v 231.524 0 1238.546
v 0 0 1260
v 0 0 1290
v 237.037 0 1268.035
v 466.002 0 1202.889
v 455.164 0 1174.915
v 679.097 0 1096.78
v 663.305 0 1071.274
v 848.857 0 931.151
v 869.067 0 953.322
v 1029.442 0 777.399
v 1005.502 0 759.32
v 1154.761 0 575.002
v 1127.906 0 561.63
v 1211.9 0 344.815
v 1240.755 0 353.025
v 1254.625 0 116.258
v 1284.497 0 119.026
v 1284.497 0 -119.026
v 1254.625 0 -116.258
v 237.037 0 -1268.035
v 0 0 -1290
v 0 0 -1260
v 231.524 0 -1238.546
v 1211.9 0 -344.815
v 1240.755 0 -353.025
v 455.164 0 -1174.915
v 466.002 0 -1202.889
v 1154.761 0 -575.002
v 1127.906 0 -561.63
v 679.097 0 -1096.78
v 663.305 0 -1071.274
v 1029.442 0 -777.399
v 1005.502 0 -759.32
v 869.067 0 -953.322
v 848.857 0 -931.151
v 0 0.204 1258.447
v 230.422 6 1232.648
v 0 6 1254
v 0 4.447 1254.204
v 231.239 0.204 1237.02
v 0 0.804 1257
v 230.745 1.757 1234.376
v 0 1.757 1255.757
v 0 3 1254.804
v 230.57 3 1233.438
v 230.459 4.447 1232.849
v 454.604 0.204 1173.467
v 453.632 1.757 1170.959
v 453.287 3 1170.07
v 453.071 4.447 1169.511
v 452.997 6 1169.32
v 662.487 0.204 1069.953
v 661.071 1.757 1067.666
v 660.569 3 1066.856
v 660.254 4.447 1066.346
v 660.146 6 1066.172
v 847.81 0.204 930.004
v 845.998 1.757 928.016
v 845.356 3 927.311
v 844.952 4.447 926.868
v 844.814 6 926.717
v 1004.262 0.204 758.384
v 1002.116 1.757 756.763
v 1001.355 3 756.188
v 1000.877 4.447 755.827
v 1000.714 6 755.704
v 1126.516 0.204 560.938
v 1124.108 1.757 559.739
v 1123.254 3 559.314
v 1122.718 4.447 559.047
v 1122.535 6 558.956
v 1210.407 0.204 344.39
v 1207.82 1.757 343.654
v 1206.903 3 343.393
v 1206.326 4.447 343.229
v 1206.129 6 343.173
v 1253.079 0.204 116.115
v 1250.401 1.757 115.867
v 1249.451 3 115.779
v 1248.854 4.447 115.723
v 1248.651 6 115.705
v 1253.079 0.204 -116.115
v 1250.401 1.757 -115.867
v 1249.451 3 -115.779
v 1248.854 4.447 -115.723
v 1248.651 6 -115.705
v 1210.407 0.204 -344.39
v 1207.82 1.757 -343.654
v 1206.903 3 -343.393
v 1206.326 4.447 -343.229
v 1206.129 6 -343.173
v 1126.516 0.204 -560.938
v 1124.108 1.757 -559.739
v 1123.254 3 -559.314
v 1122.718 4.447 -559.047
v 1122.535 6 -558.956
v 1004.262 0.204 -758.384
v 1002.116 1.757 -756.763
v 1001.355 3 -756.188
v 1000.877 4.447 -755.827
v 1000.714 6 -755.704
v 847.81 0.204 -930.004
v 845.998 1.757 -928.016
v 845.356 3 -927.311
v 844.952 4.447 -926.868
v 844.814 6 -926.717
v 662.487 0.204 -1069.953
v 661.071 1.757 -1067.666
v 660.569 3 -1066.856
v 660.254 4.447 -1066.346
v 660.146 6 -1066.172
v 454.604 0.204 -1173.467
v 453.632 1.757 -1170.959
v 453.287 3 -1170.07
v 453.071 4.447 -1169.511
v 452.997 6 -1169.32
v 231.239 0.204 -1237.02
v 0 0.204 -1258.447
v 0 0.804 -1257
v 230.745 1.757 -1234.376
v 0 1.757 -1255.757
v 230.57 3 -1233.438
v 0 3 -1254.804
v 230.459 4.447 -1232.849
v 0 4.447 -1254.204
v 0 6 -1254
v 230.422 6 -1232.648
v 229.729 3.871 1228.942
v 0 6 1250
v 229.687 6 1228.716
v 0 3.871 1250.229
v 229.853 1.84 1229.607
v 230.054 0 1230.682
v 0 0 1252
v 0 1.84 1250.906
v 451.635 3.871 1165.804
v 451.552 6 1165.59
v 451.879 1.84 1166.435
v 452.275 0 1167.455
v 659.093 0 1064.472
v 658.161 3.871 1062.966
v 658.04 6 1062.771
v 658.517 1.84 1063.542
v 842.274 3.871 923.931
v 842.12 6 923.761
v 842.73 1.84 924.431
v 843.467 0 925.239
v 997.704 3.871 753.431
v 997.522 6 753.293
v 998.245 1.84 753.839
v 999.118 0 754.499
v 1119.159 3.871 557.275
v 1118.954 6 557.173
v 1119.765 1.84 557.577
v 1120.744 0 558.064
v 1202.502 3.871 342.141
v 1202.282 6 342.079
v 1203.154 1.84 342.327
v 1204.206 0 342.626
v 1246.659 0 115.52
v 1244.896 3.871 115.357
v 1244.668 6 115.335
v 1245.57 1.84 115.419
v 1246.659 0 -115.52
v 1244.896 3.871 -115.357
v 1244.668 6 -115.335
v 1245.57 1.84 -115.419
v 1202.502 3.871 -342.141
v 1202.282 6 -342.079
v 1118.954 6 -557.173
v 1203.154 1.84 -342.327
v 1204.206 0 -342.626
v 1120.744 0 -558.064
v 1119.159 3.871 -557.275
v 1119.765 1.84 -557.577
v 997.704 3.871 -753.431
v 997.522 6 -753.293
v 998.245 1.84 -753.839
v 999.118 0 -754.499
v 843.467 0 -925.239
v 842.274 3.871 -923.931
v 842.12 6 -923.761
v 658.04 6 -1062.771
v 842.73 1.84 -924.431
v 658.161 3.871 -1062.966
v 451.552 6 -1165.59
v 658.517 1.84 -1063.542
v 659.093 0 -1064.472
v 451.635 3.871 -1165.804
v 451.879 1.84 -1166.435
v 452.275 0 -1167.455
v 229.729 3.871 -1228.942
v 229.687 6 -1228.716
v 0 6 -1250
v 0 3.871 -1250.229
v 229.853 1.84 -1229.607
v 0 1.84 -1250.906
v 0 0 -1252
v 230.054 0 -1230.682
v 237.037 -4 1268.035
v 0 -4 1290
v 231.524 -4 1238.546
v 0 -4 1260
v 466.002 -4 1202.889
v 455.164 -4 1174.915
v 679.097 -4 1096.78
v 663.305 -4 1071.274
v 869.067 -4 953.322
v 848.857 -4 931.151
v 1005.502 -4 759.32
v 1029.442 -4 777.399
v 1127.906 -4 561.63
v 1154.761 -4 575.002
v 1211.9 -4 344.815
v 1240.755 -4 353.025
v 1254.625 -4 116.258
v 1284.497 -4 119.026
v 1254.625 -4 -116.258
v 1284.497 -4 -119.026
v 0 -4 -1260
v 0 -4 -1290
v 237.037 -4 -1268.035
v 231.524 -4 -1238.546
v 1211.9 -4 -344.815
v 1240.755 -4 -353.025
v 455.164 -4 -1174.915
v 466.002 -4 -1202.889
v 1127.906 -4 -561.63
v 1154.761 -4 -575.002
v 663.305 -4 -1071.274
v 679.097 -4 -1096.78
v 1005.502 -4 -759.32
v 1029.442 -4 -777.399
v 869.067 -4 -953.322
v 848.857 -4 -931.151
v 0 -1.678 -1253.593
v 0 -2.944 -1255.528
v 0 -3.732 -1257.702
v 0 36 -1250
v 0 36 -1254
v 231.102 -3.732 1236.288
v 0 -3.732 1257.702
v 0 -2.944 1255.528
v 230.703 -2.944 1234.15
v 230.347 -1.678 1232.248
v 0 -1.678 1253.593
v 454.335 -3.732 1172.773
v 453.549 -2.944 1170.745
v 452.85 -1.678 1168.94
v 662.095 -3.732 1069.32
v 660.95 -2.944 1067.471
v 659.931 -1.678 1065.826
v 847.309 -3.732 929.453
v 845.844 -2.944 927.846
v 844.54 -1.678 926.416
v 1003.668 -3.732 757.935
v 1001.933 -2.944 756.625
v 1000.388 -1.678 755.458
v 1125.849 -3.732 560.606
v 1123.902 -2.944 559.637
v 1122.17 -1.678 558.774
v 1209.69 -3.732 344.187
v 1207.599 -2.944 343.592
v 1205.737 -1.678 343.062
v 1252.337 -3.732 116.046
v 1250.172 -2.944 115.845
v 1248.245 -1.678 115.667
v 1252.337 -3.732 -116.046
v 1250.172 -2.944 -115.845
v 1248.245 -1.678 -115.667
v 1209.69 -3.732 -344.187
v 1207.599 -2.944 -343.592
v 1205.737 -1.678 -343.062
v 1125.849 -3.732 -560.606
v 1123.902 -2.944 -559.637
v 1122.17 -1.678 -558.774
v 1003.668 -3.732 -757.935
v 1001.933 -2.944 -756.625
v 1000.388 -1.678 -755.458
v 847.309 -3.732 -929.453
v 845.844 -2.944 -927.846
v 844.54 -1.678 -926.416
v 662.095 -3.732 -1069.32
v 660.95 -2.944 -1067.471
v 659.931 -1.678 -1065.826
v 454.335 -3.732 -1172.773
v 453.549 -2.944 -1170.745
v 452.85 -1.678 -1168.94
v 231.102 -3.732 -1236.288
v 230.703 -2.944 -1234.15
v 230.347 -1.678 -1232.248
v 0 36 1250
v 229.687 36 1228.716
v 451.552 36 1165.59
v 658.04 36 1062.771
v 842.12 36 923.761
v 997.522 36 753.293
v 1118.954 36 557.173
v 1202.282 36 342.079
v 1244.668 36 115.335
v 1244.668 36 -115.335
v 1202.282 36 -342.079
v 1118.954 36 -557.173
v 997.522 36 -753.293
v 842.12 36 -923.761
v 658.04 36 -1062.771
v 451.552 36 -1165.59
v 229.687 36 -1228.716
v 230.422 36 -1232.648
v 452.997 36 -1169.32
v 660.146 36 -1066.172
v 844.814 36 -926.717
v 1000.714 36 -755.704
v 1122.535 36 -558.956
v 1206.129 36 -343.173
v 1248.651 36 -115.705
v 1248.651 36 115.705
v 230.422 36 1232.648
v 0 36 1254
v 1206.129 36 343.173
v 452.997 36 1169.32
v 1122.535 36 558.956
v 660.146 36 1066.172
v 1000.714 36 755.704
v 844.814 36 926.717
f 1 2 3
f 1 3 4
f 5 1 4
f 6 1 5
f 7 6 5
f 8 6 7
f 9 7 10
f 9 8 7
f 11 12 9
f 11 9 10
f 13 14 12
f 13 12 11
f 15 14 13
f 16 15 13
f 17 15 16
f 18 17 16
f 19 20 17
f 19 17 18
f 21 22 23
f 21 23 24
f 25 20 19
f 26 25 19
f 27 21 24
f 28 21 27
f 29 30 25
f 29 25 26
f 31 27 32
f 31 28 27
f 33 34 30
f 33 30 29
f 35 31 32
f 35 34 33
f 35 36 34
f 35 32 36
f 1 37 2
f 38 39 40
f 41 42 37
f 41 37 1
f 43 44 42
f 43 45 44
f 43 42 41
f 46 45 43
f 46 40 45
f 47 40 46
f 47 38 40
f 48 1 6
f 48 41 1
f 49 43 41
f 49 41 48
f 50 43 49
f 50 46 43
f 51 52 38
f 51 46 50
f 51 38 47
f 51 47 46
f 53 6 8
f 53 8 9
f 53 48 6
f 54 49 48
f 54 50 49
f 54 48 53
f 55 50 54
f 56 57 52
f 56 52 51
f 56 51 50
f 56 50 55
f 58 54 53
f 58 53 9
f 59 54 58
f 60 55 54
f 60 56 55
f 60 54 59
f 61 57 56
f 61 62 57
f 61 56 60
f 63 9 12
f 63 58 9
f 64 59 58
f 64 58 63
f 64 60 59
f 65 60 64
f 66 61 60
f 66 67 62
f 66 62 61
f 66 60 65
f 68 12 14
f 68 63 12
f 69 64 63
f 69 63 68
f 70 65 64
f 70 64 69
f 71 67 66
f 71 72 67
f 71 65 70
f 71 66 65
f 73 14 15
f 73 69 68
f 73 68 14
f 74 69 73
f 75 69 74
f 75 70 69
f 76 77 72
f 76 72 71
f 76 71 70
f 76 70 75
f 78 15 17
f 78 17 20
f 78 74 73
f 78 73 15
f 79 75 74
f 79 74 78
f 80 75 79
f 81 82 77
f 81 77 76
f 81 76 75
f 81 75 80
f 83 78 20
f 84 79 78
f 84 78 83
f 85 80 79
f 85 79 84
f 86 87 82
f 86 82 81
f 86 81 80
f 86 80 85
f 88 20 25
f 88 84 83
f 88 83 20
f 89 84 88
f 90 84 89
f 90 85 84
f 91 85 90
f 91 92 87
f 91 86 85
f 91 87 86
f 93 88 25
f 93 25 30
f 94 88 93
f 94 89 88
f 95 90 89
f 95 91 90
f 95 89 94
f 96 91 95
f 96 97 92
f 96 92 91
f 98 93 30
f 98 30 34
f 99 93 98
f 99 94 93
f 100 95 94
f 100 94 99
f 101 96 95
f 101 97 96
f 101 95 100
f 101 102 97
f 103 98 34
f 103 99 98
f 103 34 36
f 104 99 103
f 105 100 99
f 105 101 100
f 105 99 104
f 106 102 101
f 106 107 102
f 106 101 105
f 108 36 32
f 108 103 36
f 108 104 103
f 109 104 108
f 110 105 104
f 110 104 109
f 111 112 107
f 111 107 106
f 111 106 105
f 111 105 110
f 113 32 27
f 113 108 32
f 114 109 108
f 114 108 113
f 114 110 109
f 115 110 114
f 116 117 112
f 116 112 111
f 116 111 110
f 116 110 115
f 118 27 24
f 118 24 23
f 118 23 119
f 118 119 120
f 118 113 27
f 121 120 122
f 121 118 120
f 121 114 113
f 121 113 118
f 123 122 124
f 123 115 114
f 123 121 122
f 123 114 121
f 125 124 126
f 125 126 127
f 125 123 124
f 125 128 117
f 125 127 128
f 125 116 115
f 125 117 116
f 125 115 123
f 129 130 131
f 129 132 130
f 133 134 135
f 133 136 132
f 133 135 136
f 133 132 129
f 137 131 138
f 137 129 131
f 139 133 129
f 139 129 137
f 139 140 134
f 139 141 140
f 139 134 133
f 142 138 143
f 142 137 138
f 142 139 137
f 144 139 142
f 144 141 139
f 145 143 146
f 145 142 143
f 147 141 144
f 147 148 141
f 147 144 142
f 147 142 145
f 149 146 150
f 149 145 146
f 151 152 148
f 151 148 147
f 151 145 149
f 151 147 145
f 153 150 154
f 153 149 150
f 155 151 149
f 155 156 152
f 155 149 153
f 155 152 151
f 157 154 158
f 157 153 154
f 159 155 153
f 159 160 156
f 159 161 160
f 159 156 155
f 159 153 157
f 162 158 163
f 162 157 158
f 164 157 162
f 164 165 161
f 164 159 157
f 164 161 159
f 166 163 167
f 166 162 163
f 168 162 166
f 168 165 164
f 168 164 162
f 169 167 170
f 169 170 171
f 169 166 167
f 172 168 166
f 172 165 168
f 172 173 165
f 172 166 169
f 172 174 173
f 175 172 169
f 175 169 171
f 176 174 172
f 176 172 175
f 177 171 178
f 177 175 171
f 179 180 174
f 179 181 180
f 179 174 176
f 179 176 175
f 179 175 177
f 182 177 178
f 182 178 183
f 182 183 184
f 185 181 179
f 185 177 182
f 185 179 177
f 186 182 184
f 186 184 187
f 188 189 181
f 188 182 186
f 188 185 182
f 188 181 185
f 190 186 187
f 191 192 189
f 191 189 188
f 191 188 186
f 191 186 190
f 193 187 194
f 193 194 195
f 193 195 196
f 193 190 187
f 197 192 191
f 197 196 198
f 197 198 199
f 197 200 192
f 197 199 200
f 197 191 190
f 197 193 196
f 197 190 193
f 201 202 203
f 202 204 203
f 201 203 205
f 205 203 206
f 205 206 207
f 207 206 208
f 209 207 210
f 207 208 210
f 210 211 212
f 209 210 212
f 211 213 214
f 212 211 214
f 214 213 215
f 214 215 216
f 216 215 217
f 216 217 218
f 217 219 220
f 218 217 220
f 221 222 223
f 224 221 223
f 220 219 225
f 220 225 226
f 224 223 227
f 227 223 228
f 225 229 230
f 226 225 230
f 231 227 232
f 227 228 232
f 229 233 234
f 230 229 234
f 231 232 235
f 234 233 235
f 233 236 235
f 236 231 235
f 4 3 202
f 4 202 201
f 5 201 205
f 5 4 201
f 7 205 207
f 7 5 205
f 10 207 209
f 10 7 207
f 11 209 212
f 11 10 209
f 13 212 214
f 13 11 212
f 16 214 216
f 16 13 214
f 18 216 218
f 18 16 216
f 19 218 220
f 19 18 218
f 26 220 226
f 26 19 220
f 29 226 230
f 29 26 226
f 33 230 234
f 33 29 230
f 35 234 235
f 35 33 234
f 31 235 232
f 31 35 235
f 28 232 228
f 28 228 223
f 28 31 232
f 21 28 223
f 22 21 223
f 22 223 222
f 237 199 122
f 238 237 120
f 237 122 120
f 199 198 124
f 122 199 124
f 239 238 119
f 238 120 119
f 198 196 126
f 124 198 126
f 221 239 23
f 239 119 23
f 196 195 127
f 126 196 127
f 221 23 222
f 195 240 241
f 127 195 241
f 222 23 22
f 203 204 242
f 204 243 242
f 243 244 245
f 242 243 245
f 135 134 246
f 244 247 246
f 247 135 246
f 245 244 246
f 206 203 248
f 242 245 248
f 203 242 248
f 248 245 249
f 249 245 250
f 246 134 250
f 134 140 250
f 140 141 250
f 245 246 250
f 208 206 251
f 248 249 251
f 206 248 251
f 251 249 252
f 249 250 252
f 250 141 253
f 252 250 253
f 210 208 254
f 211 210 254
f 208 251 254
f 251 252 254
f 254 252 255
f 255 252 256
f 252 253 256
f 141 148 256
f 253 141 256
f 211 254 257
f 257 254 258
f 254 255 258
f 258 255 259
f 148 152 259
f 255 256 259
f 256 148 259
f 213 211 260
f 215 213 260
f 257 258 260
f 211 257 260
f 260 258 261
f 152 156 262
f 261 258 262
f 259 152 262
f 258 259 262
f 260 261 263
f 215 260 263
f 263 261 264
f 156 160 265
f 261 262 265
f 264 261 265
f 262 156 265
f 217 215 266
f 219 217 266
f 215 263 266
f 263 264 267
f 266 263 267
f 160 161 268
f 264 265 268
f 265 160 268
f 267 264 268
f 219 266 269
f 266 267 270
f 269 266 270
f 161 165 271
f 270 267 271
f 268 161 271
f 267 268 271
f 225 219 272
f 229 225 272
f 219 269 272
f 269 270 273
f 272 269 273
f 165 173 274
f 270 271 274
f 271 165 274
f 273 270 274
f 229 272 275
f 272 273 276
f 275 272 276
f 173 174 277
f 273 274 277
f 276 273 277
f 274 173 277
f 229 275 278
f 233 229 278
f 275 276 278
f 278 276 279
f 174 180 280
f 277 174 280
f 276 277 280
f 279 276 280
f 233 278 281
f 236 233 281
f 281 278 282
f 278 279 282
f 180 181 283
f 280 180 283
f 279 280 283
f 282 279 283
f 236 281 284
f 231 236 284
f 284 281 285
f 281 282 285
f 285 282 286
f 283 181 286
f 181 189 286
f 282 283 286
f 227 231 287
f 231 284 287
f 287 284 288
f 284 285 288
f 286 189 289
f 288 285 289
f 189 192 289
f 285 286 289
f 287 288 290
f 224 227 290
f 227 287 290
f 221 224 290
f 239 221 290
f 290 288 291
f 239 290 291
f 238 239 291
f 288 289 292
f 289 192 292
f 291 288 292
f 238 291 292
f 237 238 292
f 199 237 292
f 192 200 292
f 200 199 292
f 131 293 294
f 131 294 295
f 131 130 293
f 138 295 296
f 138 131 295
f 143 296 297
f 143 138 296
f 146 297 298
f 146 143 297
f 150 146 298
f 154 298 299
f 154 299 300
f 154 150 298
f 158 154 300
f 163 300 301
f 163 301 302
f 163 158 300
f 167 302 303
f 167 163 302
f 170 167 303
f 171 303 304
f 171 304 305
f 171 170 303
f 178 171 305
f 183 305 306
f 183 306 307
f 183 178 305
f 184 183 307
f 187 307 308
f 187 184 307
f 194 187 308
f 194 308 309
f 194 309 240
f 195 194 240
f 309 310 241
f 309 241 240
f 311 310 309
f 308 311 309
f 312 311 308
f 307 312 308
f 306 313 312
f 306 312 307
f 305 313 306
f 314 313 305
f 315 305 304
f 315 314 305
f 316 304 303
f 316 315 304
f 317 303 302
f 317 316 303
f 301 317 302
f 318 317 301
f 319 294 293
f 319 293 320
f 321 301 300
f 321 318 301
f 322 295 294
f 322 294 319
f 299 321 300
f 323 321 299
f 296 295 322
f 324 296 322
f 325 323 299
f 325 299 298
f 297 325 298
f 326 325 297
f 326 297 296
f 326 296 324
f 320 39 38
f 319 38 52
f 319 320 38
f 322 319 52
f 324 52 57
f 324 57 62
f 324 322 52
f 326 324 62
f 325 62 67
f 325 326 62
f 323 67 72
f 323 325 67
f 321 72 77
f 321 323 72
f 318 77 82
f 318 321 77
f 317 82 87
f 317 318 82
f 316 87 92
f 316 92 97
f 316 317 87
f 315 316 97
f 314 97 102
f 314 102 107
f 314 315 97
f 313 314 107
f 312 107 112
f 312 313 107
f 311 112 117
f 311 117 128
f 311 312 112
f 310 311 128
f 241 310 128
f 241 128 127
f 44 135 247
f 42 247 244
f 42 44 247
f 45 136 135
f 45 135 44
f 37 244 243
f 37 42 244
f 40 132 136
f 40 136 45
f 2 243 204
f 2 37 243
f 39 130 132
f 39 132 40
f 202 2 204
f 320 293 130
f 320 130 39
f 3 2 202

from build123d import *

# Parameters (mm, degrees)
BASE_FLANGE1_DEPTH   = 4
EDGE_FLANGE1_ANGLE   = 180
EDGE_FLANGE1_2_ANGLE = 180


# Read off the part's stored shape, not the designer's step: Edge-Flange1
# Sheet-metal steps are written as plain solids
with BuildPart() as part:
    # Sketch1 → Base-Flange1 (new body)
    with BuildSketch(Plane(origin=(0, 0, 0), x_dir=(1, 0, 0), z_dir=(0, 1, 0))):
        with BuildLine():
            Line((0, 1290), (0, 1250))
            ThreePointArc((0, 1250), (1250, 0), (0, -1250))
            Line((0, -1250), (0, -1290))
            ThreePointArc((0, -1290), (1290, 0), (0, 1290))
        make_face()
    extrude(amount=-BASE_FLANGE1_DEPTH)

    # Edge-Flange1 outline → Edge-Flange1 (revolve, cut)
    with BuildSketch(Plane.ZY):
        with BuildLine():
            Line((1252, 0), (1250, 0))
            Line((1250, 0), (1250, -4))
            Line((1250, -4), (1260, -4))
            ThreePointArc((1260, -4), (1255.527864045, -2.94427191), (1252, 0))
        make_face()
    revolve(axis=Axis((0, 0, 0), (0, 1, 0)), revolution_arc=EDGE_FLANGE1_ANGLE, mode=Mode.SUBTRACT)

    # Edge-Flange1 2 outline → Edge-Flange1 2 (revolve)
    with BuildSketch(Plane.ZY):
        with BuildLine():
            Line((1254, 36), (1250, 36))
            Line((1250, 36), (1250, 6))
            ThreePointArc((1250, 6), (1250.513167019, 2.83772234), (1252, 0))
            Line((1252, 0), (1260, 0))
            ThreePointArc((1260, 0), (1255.757359313, 1.757359313), (1254, 6))
            Line((1254, 6), (1254, 36))
        make_face()
    revolve(axis=Axis((0, 0, 0), (0, 1, 0)), revolution_arc=EDGE_FLANGE1_2_ANGLE)


solid = part.part
